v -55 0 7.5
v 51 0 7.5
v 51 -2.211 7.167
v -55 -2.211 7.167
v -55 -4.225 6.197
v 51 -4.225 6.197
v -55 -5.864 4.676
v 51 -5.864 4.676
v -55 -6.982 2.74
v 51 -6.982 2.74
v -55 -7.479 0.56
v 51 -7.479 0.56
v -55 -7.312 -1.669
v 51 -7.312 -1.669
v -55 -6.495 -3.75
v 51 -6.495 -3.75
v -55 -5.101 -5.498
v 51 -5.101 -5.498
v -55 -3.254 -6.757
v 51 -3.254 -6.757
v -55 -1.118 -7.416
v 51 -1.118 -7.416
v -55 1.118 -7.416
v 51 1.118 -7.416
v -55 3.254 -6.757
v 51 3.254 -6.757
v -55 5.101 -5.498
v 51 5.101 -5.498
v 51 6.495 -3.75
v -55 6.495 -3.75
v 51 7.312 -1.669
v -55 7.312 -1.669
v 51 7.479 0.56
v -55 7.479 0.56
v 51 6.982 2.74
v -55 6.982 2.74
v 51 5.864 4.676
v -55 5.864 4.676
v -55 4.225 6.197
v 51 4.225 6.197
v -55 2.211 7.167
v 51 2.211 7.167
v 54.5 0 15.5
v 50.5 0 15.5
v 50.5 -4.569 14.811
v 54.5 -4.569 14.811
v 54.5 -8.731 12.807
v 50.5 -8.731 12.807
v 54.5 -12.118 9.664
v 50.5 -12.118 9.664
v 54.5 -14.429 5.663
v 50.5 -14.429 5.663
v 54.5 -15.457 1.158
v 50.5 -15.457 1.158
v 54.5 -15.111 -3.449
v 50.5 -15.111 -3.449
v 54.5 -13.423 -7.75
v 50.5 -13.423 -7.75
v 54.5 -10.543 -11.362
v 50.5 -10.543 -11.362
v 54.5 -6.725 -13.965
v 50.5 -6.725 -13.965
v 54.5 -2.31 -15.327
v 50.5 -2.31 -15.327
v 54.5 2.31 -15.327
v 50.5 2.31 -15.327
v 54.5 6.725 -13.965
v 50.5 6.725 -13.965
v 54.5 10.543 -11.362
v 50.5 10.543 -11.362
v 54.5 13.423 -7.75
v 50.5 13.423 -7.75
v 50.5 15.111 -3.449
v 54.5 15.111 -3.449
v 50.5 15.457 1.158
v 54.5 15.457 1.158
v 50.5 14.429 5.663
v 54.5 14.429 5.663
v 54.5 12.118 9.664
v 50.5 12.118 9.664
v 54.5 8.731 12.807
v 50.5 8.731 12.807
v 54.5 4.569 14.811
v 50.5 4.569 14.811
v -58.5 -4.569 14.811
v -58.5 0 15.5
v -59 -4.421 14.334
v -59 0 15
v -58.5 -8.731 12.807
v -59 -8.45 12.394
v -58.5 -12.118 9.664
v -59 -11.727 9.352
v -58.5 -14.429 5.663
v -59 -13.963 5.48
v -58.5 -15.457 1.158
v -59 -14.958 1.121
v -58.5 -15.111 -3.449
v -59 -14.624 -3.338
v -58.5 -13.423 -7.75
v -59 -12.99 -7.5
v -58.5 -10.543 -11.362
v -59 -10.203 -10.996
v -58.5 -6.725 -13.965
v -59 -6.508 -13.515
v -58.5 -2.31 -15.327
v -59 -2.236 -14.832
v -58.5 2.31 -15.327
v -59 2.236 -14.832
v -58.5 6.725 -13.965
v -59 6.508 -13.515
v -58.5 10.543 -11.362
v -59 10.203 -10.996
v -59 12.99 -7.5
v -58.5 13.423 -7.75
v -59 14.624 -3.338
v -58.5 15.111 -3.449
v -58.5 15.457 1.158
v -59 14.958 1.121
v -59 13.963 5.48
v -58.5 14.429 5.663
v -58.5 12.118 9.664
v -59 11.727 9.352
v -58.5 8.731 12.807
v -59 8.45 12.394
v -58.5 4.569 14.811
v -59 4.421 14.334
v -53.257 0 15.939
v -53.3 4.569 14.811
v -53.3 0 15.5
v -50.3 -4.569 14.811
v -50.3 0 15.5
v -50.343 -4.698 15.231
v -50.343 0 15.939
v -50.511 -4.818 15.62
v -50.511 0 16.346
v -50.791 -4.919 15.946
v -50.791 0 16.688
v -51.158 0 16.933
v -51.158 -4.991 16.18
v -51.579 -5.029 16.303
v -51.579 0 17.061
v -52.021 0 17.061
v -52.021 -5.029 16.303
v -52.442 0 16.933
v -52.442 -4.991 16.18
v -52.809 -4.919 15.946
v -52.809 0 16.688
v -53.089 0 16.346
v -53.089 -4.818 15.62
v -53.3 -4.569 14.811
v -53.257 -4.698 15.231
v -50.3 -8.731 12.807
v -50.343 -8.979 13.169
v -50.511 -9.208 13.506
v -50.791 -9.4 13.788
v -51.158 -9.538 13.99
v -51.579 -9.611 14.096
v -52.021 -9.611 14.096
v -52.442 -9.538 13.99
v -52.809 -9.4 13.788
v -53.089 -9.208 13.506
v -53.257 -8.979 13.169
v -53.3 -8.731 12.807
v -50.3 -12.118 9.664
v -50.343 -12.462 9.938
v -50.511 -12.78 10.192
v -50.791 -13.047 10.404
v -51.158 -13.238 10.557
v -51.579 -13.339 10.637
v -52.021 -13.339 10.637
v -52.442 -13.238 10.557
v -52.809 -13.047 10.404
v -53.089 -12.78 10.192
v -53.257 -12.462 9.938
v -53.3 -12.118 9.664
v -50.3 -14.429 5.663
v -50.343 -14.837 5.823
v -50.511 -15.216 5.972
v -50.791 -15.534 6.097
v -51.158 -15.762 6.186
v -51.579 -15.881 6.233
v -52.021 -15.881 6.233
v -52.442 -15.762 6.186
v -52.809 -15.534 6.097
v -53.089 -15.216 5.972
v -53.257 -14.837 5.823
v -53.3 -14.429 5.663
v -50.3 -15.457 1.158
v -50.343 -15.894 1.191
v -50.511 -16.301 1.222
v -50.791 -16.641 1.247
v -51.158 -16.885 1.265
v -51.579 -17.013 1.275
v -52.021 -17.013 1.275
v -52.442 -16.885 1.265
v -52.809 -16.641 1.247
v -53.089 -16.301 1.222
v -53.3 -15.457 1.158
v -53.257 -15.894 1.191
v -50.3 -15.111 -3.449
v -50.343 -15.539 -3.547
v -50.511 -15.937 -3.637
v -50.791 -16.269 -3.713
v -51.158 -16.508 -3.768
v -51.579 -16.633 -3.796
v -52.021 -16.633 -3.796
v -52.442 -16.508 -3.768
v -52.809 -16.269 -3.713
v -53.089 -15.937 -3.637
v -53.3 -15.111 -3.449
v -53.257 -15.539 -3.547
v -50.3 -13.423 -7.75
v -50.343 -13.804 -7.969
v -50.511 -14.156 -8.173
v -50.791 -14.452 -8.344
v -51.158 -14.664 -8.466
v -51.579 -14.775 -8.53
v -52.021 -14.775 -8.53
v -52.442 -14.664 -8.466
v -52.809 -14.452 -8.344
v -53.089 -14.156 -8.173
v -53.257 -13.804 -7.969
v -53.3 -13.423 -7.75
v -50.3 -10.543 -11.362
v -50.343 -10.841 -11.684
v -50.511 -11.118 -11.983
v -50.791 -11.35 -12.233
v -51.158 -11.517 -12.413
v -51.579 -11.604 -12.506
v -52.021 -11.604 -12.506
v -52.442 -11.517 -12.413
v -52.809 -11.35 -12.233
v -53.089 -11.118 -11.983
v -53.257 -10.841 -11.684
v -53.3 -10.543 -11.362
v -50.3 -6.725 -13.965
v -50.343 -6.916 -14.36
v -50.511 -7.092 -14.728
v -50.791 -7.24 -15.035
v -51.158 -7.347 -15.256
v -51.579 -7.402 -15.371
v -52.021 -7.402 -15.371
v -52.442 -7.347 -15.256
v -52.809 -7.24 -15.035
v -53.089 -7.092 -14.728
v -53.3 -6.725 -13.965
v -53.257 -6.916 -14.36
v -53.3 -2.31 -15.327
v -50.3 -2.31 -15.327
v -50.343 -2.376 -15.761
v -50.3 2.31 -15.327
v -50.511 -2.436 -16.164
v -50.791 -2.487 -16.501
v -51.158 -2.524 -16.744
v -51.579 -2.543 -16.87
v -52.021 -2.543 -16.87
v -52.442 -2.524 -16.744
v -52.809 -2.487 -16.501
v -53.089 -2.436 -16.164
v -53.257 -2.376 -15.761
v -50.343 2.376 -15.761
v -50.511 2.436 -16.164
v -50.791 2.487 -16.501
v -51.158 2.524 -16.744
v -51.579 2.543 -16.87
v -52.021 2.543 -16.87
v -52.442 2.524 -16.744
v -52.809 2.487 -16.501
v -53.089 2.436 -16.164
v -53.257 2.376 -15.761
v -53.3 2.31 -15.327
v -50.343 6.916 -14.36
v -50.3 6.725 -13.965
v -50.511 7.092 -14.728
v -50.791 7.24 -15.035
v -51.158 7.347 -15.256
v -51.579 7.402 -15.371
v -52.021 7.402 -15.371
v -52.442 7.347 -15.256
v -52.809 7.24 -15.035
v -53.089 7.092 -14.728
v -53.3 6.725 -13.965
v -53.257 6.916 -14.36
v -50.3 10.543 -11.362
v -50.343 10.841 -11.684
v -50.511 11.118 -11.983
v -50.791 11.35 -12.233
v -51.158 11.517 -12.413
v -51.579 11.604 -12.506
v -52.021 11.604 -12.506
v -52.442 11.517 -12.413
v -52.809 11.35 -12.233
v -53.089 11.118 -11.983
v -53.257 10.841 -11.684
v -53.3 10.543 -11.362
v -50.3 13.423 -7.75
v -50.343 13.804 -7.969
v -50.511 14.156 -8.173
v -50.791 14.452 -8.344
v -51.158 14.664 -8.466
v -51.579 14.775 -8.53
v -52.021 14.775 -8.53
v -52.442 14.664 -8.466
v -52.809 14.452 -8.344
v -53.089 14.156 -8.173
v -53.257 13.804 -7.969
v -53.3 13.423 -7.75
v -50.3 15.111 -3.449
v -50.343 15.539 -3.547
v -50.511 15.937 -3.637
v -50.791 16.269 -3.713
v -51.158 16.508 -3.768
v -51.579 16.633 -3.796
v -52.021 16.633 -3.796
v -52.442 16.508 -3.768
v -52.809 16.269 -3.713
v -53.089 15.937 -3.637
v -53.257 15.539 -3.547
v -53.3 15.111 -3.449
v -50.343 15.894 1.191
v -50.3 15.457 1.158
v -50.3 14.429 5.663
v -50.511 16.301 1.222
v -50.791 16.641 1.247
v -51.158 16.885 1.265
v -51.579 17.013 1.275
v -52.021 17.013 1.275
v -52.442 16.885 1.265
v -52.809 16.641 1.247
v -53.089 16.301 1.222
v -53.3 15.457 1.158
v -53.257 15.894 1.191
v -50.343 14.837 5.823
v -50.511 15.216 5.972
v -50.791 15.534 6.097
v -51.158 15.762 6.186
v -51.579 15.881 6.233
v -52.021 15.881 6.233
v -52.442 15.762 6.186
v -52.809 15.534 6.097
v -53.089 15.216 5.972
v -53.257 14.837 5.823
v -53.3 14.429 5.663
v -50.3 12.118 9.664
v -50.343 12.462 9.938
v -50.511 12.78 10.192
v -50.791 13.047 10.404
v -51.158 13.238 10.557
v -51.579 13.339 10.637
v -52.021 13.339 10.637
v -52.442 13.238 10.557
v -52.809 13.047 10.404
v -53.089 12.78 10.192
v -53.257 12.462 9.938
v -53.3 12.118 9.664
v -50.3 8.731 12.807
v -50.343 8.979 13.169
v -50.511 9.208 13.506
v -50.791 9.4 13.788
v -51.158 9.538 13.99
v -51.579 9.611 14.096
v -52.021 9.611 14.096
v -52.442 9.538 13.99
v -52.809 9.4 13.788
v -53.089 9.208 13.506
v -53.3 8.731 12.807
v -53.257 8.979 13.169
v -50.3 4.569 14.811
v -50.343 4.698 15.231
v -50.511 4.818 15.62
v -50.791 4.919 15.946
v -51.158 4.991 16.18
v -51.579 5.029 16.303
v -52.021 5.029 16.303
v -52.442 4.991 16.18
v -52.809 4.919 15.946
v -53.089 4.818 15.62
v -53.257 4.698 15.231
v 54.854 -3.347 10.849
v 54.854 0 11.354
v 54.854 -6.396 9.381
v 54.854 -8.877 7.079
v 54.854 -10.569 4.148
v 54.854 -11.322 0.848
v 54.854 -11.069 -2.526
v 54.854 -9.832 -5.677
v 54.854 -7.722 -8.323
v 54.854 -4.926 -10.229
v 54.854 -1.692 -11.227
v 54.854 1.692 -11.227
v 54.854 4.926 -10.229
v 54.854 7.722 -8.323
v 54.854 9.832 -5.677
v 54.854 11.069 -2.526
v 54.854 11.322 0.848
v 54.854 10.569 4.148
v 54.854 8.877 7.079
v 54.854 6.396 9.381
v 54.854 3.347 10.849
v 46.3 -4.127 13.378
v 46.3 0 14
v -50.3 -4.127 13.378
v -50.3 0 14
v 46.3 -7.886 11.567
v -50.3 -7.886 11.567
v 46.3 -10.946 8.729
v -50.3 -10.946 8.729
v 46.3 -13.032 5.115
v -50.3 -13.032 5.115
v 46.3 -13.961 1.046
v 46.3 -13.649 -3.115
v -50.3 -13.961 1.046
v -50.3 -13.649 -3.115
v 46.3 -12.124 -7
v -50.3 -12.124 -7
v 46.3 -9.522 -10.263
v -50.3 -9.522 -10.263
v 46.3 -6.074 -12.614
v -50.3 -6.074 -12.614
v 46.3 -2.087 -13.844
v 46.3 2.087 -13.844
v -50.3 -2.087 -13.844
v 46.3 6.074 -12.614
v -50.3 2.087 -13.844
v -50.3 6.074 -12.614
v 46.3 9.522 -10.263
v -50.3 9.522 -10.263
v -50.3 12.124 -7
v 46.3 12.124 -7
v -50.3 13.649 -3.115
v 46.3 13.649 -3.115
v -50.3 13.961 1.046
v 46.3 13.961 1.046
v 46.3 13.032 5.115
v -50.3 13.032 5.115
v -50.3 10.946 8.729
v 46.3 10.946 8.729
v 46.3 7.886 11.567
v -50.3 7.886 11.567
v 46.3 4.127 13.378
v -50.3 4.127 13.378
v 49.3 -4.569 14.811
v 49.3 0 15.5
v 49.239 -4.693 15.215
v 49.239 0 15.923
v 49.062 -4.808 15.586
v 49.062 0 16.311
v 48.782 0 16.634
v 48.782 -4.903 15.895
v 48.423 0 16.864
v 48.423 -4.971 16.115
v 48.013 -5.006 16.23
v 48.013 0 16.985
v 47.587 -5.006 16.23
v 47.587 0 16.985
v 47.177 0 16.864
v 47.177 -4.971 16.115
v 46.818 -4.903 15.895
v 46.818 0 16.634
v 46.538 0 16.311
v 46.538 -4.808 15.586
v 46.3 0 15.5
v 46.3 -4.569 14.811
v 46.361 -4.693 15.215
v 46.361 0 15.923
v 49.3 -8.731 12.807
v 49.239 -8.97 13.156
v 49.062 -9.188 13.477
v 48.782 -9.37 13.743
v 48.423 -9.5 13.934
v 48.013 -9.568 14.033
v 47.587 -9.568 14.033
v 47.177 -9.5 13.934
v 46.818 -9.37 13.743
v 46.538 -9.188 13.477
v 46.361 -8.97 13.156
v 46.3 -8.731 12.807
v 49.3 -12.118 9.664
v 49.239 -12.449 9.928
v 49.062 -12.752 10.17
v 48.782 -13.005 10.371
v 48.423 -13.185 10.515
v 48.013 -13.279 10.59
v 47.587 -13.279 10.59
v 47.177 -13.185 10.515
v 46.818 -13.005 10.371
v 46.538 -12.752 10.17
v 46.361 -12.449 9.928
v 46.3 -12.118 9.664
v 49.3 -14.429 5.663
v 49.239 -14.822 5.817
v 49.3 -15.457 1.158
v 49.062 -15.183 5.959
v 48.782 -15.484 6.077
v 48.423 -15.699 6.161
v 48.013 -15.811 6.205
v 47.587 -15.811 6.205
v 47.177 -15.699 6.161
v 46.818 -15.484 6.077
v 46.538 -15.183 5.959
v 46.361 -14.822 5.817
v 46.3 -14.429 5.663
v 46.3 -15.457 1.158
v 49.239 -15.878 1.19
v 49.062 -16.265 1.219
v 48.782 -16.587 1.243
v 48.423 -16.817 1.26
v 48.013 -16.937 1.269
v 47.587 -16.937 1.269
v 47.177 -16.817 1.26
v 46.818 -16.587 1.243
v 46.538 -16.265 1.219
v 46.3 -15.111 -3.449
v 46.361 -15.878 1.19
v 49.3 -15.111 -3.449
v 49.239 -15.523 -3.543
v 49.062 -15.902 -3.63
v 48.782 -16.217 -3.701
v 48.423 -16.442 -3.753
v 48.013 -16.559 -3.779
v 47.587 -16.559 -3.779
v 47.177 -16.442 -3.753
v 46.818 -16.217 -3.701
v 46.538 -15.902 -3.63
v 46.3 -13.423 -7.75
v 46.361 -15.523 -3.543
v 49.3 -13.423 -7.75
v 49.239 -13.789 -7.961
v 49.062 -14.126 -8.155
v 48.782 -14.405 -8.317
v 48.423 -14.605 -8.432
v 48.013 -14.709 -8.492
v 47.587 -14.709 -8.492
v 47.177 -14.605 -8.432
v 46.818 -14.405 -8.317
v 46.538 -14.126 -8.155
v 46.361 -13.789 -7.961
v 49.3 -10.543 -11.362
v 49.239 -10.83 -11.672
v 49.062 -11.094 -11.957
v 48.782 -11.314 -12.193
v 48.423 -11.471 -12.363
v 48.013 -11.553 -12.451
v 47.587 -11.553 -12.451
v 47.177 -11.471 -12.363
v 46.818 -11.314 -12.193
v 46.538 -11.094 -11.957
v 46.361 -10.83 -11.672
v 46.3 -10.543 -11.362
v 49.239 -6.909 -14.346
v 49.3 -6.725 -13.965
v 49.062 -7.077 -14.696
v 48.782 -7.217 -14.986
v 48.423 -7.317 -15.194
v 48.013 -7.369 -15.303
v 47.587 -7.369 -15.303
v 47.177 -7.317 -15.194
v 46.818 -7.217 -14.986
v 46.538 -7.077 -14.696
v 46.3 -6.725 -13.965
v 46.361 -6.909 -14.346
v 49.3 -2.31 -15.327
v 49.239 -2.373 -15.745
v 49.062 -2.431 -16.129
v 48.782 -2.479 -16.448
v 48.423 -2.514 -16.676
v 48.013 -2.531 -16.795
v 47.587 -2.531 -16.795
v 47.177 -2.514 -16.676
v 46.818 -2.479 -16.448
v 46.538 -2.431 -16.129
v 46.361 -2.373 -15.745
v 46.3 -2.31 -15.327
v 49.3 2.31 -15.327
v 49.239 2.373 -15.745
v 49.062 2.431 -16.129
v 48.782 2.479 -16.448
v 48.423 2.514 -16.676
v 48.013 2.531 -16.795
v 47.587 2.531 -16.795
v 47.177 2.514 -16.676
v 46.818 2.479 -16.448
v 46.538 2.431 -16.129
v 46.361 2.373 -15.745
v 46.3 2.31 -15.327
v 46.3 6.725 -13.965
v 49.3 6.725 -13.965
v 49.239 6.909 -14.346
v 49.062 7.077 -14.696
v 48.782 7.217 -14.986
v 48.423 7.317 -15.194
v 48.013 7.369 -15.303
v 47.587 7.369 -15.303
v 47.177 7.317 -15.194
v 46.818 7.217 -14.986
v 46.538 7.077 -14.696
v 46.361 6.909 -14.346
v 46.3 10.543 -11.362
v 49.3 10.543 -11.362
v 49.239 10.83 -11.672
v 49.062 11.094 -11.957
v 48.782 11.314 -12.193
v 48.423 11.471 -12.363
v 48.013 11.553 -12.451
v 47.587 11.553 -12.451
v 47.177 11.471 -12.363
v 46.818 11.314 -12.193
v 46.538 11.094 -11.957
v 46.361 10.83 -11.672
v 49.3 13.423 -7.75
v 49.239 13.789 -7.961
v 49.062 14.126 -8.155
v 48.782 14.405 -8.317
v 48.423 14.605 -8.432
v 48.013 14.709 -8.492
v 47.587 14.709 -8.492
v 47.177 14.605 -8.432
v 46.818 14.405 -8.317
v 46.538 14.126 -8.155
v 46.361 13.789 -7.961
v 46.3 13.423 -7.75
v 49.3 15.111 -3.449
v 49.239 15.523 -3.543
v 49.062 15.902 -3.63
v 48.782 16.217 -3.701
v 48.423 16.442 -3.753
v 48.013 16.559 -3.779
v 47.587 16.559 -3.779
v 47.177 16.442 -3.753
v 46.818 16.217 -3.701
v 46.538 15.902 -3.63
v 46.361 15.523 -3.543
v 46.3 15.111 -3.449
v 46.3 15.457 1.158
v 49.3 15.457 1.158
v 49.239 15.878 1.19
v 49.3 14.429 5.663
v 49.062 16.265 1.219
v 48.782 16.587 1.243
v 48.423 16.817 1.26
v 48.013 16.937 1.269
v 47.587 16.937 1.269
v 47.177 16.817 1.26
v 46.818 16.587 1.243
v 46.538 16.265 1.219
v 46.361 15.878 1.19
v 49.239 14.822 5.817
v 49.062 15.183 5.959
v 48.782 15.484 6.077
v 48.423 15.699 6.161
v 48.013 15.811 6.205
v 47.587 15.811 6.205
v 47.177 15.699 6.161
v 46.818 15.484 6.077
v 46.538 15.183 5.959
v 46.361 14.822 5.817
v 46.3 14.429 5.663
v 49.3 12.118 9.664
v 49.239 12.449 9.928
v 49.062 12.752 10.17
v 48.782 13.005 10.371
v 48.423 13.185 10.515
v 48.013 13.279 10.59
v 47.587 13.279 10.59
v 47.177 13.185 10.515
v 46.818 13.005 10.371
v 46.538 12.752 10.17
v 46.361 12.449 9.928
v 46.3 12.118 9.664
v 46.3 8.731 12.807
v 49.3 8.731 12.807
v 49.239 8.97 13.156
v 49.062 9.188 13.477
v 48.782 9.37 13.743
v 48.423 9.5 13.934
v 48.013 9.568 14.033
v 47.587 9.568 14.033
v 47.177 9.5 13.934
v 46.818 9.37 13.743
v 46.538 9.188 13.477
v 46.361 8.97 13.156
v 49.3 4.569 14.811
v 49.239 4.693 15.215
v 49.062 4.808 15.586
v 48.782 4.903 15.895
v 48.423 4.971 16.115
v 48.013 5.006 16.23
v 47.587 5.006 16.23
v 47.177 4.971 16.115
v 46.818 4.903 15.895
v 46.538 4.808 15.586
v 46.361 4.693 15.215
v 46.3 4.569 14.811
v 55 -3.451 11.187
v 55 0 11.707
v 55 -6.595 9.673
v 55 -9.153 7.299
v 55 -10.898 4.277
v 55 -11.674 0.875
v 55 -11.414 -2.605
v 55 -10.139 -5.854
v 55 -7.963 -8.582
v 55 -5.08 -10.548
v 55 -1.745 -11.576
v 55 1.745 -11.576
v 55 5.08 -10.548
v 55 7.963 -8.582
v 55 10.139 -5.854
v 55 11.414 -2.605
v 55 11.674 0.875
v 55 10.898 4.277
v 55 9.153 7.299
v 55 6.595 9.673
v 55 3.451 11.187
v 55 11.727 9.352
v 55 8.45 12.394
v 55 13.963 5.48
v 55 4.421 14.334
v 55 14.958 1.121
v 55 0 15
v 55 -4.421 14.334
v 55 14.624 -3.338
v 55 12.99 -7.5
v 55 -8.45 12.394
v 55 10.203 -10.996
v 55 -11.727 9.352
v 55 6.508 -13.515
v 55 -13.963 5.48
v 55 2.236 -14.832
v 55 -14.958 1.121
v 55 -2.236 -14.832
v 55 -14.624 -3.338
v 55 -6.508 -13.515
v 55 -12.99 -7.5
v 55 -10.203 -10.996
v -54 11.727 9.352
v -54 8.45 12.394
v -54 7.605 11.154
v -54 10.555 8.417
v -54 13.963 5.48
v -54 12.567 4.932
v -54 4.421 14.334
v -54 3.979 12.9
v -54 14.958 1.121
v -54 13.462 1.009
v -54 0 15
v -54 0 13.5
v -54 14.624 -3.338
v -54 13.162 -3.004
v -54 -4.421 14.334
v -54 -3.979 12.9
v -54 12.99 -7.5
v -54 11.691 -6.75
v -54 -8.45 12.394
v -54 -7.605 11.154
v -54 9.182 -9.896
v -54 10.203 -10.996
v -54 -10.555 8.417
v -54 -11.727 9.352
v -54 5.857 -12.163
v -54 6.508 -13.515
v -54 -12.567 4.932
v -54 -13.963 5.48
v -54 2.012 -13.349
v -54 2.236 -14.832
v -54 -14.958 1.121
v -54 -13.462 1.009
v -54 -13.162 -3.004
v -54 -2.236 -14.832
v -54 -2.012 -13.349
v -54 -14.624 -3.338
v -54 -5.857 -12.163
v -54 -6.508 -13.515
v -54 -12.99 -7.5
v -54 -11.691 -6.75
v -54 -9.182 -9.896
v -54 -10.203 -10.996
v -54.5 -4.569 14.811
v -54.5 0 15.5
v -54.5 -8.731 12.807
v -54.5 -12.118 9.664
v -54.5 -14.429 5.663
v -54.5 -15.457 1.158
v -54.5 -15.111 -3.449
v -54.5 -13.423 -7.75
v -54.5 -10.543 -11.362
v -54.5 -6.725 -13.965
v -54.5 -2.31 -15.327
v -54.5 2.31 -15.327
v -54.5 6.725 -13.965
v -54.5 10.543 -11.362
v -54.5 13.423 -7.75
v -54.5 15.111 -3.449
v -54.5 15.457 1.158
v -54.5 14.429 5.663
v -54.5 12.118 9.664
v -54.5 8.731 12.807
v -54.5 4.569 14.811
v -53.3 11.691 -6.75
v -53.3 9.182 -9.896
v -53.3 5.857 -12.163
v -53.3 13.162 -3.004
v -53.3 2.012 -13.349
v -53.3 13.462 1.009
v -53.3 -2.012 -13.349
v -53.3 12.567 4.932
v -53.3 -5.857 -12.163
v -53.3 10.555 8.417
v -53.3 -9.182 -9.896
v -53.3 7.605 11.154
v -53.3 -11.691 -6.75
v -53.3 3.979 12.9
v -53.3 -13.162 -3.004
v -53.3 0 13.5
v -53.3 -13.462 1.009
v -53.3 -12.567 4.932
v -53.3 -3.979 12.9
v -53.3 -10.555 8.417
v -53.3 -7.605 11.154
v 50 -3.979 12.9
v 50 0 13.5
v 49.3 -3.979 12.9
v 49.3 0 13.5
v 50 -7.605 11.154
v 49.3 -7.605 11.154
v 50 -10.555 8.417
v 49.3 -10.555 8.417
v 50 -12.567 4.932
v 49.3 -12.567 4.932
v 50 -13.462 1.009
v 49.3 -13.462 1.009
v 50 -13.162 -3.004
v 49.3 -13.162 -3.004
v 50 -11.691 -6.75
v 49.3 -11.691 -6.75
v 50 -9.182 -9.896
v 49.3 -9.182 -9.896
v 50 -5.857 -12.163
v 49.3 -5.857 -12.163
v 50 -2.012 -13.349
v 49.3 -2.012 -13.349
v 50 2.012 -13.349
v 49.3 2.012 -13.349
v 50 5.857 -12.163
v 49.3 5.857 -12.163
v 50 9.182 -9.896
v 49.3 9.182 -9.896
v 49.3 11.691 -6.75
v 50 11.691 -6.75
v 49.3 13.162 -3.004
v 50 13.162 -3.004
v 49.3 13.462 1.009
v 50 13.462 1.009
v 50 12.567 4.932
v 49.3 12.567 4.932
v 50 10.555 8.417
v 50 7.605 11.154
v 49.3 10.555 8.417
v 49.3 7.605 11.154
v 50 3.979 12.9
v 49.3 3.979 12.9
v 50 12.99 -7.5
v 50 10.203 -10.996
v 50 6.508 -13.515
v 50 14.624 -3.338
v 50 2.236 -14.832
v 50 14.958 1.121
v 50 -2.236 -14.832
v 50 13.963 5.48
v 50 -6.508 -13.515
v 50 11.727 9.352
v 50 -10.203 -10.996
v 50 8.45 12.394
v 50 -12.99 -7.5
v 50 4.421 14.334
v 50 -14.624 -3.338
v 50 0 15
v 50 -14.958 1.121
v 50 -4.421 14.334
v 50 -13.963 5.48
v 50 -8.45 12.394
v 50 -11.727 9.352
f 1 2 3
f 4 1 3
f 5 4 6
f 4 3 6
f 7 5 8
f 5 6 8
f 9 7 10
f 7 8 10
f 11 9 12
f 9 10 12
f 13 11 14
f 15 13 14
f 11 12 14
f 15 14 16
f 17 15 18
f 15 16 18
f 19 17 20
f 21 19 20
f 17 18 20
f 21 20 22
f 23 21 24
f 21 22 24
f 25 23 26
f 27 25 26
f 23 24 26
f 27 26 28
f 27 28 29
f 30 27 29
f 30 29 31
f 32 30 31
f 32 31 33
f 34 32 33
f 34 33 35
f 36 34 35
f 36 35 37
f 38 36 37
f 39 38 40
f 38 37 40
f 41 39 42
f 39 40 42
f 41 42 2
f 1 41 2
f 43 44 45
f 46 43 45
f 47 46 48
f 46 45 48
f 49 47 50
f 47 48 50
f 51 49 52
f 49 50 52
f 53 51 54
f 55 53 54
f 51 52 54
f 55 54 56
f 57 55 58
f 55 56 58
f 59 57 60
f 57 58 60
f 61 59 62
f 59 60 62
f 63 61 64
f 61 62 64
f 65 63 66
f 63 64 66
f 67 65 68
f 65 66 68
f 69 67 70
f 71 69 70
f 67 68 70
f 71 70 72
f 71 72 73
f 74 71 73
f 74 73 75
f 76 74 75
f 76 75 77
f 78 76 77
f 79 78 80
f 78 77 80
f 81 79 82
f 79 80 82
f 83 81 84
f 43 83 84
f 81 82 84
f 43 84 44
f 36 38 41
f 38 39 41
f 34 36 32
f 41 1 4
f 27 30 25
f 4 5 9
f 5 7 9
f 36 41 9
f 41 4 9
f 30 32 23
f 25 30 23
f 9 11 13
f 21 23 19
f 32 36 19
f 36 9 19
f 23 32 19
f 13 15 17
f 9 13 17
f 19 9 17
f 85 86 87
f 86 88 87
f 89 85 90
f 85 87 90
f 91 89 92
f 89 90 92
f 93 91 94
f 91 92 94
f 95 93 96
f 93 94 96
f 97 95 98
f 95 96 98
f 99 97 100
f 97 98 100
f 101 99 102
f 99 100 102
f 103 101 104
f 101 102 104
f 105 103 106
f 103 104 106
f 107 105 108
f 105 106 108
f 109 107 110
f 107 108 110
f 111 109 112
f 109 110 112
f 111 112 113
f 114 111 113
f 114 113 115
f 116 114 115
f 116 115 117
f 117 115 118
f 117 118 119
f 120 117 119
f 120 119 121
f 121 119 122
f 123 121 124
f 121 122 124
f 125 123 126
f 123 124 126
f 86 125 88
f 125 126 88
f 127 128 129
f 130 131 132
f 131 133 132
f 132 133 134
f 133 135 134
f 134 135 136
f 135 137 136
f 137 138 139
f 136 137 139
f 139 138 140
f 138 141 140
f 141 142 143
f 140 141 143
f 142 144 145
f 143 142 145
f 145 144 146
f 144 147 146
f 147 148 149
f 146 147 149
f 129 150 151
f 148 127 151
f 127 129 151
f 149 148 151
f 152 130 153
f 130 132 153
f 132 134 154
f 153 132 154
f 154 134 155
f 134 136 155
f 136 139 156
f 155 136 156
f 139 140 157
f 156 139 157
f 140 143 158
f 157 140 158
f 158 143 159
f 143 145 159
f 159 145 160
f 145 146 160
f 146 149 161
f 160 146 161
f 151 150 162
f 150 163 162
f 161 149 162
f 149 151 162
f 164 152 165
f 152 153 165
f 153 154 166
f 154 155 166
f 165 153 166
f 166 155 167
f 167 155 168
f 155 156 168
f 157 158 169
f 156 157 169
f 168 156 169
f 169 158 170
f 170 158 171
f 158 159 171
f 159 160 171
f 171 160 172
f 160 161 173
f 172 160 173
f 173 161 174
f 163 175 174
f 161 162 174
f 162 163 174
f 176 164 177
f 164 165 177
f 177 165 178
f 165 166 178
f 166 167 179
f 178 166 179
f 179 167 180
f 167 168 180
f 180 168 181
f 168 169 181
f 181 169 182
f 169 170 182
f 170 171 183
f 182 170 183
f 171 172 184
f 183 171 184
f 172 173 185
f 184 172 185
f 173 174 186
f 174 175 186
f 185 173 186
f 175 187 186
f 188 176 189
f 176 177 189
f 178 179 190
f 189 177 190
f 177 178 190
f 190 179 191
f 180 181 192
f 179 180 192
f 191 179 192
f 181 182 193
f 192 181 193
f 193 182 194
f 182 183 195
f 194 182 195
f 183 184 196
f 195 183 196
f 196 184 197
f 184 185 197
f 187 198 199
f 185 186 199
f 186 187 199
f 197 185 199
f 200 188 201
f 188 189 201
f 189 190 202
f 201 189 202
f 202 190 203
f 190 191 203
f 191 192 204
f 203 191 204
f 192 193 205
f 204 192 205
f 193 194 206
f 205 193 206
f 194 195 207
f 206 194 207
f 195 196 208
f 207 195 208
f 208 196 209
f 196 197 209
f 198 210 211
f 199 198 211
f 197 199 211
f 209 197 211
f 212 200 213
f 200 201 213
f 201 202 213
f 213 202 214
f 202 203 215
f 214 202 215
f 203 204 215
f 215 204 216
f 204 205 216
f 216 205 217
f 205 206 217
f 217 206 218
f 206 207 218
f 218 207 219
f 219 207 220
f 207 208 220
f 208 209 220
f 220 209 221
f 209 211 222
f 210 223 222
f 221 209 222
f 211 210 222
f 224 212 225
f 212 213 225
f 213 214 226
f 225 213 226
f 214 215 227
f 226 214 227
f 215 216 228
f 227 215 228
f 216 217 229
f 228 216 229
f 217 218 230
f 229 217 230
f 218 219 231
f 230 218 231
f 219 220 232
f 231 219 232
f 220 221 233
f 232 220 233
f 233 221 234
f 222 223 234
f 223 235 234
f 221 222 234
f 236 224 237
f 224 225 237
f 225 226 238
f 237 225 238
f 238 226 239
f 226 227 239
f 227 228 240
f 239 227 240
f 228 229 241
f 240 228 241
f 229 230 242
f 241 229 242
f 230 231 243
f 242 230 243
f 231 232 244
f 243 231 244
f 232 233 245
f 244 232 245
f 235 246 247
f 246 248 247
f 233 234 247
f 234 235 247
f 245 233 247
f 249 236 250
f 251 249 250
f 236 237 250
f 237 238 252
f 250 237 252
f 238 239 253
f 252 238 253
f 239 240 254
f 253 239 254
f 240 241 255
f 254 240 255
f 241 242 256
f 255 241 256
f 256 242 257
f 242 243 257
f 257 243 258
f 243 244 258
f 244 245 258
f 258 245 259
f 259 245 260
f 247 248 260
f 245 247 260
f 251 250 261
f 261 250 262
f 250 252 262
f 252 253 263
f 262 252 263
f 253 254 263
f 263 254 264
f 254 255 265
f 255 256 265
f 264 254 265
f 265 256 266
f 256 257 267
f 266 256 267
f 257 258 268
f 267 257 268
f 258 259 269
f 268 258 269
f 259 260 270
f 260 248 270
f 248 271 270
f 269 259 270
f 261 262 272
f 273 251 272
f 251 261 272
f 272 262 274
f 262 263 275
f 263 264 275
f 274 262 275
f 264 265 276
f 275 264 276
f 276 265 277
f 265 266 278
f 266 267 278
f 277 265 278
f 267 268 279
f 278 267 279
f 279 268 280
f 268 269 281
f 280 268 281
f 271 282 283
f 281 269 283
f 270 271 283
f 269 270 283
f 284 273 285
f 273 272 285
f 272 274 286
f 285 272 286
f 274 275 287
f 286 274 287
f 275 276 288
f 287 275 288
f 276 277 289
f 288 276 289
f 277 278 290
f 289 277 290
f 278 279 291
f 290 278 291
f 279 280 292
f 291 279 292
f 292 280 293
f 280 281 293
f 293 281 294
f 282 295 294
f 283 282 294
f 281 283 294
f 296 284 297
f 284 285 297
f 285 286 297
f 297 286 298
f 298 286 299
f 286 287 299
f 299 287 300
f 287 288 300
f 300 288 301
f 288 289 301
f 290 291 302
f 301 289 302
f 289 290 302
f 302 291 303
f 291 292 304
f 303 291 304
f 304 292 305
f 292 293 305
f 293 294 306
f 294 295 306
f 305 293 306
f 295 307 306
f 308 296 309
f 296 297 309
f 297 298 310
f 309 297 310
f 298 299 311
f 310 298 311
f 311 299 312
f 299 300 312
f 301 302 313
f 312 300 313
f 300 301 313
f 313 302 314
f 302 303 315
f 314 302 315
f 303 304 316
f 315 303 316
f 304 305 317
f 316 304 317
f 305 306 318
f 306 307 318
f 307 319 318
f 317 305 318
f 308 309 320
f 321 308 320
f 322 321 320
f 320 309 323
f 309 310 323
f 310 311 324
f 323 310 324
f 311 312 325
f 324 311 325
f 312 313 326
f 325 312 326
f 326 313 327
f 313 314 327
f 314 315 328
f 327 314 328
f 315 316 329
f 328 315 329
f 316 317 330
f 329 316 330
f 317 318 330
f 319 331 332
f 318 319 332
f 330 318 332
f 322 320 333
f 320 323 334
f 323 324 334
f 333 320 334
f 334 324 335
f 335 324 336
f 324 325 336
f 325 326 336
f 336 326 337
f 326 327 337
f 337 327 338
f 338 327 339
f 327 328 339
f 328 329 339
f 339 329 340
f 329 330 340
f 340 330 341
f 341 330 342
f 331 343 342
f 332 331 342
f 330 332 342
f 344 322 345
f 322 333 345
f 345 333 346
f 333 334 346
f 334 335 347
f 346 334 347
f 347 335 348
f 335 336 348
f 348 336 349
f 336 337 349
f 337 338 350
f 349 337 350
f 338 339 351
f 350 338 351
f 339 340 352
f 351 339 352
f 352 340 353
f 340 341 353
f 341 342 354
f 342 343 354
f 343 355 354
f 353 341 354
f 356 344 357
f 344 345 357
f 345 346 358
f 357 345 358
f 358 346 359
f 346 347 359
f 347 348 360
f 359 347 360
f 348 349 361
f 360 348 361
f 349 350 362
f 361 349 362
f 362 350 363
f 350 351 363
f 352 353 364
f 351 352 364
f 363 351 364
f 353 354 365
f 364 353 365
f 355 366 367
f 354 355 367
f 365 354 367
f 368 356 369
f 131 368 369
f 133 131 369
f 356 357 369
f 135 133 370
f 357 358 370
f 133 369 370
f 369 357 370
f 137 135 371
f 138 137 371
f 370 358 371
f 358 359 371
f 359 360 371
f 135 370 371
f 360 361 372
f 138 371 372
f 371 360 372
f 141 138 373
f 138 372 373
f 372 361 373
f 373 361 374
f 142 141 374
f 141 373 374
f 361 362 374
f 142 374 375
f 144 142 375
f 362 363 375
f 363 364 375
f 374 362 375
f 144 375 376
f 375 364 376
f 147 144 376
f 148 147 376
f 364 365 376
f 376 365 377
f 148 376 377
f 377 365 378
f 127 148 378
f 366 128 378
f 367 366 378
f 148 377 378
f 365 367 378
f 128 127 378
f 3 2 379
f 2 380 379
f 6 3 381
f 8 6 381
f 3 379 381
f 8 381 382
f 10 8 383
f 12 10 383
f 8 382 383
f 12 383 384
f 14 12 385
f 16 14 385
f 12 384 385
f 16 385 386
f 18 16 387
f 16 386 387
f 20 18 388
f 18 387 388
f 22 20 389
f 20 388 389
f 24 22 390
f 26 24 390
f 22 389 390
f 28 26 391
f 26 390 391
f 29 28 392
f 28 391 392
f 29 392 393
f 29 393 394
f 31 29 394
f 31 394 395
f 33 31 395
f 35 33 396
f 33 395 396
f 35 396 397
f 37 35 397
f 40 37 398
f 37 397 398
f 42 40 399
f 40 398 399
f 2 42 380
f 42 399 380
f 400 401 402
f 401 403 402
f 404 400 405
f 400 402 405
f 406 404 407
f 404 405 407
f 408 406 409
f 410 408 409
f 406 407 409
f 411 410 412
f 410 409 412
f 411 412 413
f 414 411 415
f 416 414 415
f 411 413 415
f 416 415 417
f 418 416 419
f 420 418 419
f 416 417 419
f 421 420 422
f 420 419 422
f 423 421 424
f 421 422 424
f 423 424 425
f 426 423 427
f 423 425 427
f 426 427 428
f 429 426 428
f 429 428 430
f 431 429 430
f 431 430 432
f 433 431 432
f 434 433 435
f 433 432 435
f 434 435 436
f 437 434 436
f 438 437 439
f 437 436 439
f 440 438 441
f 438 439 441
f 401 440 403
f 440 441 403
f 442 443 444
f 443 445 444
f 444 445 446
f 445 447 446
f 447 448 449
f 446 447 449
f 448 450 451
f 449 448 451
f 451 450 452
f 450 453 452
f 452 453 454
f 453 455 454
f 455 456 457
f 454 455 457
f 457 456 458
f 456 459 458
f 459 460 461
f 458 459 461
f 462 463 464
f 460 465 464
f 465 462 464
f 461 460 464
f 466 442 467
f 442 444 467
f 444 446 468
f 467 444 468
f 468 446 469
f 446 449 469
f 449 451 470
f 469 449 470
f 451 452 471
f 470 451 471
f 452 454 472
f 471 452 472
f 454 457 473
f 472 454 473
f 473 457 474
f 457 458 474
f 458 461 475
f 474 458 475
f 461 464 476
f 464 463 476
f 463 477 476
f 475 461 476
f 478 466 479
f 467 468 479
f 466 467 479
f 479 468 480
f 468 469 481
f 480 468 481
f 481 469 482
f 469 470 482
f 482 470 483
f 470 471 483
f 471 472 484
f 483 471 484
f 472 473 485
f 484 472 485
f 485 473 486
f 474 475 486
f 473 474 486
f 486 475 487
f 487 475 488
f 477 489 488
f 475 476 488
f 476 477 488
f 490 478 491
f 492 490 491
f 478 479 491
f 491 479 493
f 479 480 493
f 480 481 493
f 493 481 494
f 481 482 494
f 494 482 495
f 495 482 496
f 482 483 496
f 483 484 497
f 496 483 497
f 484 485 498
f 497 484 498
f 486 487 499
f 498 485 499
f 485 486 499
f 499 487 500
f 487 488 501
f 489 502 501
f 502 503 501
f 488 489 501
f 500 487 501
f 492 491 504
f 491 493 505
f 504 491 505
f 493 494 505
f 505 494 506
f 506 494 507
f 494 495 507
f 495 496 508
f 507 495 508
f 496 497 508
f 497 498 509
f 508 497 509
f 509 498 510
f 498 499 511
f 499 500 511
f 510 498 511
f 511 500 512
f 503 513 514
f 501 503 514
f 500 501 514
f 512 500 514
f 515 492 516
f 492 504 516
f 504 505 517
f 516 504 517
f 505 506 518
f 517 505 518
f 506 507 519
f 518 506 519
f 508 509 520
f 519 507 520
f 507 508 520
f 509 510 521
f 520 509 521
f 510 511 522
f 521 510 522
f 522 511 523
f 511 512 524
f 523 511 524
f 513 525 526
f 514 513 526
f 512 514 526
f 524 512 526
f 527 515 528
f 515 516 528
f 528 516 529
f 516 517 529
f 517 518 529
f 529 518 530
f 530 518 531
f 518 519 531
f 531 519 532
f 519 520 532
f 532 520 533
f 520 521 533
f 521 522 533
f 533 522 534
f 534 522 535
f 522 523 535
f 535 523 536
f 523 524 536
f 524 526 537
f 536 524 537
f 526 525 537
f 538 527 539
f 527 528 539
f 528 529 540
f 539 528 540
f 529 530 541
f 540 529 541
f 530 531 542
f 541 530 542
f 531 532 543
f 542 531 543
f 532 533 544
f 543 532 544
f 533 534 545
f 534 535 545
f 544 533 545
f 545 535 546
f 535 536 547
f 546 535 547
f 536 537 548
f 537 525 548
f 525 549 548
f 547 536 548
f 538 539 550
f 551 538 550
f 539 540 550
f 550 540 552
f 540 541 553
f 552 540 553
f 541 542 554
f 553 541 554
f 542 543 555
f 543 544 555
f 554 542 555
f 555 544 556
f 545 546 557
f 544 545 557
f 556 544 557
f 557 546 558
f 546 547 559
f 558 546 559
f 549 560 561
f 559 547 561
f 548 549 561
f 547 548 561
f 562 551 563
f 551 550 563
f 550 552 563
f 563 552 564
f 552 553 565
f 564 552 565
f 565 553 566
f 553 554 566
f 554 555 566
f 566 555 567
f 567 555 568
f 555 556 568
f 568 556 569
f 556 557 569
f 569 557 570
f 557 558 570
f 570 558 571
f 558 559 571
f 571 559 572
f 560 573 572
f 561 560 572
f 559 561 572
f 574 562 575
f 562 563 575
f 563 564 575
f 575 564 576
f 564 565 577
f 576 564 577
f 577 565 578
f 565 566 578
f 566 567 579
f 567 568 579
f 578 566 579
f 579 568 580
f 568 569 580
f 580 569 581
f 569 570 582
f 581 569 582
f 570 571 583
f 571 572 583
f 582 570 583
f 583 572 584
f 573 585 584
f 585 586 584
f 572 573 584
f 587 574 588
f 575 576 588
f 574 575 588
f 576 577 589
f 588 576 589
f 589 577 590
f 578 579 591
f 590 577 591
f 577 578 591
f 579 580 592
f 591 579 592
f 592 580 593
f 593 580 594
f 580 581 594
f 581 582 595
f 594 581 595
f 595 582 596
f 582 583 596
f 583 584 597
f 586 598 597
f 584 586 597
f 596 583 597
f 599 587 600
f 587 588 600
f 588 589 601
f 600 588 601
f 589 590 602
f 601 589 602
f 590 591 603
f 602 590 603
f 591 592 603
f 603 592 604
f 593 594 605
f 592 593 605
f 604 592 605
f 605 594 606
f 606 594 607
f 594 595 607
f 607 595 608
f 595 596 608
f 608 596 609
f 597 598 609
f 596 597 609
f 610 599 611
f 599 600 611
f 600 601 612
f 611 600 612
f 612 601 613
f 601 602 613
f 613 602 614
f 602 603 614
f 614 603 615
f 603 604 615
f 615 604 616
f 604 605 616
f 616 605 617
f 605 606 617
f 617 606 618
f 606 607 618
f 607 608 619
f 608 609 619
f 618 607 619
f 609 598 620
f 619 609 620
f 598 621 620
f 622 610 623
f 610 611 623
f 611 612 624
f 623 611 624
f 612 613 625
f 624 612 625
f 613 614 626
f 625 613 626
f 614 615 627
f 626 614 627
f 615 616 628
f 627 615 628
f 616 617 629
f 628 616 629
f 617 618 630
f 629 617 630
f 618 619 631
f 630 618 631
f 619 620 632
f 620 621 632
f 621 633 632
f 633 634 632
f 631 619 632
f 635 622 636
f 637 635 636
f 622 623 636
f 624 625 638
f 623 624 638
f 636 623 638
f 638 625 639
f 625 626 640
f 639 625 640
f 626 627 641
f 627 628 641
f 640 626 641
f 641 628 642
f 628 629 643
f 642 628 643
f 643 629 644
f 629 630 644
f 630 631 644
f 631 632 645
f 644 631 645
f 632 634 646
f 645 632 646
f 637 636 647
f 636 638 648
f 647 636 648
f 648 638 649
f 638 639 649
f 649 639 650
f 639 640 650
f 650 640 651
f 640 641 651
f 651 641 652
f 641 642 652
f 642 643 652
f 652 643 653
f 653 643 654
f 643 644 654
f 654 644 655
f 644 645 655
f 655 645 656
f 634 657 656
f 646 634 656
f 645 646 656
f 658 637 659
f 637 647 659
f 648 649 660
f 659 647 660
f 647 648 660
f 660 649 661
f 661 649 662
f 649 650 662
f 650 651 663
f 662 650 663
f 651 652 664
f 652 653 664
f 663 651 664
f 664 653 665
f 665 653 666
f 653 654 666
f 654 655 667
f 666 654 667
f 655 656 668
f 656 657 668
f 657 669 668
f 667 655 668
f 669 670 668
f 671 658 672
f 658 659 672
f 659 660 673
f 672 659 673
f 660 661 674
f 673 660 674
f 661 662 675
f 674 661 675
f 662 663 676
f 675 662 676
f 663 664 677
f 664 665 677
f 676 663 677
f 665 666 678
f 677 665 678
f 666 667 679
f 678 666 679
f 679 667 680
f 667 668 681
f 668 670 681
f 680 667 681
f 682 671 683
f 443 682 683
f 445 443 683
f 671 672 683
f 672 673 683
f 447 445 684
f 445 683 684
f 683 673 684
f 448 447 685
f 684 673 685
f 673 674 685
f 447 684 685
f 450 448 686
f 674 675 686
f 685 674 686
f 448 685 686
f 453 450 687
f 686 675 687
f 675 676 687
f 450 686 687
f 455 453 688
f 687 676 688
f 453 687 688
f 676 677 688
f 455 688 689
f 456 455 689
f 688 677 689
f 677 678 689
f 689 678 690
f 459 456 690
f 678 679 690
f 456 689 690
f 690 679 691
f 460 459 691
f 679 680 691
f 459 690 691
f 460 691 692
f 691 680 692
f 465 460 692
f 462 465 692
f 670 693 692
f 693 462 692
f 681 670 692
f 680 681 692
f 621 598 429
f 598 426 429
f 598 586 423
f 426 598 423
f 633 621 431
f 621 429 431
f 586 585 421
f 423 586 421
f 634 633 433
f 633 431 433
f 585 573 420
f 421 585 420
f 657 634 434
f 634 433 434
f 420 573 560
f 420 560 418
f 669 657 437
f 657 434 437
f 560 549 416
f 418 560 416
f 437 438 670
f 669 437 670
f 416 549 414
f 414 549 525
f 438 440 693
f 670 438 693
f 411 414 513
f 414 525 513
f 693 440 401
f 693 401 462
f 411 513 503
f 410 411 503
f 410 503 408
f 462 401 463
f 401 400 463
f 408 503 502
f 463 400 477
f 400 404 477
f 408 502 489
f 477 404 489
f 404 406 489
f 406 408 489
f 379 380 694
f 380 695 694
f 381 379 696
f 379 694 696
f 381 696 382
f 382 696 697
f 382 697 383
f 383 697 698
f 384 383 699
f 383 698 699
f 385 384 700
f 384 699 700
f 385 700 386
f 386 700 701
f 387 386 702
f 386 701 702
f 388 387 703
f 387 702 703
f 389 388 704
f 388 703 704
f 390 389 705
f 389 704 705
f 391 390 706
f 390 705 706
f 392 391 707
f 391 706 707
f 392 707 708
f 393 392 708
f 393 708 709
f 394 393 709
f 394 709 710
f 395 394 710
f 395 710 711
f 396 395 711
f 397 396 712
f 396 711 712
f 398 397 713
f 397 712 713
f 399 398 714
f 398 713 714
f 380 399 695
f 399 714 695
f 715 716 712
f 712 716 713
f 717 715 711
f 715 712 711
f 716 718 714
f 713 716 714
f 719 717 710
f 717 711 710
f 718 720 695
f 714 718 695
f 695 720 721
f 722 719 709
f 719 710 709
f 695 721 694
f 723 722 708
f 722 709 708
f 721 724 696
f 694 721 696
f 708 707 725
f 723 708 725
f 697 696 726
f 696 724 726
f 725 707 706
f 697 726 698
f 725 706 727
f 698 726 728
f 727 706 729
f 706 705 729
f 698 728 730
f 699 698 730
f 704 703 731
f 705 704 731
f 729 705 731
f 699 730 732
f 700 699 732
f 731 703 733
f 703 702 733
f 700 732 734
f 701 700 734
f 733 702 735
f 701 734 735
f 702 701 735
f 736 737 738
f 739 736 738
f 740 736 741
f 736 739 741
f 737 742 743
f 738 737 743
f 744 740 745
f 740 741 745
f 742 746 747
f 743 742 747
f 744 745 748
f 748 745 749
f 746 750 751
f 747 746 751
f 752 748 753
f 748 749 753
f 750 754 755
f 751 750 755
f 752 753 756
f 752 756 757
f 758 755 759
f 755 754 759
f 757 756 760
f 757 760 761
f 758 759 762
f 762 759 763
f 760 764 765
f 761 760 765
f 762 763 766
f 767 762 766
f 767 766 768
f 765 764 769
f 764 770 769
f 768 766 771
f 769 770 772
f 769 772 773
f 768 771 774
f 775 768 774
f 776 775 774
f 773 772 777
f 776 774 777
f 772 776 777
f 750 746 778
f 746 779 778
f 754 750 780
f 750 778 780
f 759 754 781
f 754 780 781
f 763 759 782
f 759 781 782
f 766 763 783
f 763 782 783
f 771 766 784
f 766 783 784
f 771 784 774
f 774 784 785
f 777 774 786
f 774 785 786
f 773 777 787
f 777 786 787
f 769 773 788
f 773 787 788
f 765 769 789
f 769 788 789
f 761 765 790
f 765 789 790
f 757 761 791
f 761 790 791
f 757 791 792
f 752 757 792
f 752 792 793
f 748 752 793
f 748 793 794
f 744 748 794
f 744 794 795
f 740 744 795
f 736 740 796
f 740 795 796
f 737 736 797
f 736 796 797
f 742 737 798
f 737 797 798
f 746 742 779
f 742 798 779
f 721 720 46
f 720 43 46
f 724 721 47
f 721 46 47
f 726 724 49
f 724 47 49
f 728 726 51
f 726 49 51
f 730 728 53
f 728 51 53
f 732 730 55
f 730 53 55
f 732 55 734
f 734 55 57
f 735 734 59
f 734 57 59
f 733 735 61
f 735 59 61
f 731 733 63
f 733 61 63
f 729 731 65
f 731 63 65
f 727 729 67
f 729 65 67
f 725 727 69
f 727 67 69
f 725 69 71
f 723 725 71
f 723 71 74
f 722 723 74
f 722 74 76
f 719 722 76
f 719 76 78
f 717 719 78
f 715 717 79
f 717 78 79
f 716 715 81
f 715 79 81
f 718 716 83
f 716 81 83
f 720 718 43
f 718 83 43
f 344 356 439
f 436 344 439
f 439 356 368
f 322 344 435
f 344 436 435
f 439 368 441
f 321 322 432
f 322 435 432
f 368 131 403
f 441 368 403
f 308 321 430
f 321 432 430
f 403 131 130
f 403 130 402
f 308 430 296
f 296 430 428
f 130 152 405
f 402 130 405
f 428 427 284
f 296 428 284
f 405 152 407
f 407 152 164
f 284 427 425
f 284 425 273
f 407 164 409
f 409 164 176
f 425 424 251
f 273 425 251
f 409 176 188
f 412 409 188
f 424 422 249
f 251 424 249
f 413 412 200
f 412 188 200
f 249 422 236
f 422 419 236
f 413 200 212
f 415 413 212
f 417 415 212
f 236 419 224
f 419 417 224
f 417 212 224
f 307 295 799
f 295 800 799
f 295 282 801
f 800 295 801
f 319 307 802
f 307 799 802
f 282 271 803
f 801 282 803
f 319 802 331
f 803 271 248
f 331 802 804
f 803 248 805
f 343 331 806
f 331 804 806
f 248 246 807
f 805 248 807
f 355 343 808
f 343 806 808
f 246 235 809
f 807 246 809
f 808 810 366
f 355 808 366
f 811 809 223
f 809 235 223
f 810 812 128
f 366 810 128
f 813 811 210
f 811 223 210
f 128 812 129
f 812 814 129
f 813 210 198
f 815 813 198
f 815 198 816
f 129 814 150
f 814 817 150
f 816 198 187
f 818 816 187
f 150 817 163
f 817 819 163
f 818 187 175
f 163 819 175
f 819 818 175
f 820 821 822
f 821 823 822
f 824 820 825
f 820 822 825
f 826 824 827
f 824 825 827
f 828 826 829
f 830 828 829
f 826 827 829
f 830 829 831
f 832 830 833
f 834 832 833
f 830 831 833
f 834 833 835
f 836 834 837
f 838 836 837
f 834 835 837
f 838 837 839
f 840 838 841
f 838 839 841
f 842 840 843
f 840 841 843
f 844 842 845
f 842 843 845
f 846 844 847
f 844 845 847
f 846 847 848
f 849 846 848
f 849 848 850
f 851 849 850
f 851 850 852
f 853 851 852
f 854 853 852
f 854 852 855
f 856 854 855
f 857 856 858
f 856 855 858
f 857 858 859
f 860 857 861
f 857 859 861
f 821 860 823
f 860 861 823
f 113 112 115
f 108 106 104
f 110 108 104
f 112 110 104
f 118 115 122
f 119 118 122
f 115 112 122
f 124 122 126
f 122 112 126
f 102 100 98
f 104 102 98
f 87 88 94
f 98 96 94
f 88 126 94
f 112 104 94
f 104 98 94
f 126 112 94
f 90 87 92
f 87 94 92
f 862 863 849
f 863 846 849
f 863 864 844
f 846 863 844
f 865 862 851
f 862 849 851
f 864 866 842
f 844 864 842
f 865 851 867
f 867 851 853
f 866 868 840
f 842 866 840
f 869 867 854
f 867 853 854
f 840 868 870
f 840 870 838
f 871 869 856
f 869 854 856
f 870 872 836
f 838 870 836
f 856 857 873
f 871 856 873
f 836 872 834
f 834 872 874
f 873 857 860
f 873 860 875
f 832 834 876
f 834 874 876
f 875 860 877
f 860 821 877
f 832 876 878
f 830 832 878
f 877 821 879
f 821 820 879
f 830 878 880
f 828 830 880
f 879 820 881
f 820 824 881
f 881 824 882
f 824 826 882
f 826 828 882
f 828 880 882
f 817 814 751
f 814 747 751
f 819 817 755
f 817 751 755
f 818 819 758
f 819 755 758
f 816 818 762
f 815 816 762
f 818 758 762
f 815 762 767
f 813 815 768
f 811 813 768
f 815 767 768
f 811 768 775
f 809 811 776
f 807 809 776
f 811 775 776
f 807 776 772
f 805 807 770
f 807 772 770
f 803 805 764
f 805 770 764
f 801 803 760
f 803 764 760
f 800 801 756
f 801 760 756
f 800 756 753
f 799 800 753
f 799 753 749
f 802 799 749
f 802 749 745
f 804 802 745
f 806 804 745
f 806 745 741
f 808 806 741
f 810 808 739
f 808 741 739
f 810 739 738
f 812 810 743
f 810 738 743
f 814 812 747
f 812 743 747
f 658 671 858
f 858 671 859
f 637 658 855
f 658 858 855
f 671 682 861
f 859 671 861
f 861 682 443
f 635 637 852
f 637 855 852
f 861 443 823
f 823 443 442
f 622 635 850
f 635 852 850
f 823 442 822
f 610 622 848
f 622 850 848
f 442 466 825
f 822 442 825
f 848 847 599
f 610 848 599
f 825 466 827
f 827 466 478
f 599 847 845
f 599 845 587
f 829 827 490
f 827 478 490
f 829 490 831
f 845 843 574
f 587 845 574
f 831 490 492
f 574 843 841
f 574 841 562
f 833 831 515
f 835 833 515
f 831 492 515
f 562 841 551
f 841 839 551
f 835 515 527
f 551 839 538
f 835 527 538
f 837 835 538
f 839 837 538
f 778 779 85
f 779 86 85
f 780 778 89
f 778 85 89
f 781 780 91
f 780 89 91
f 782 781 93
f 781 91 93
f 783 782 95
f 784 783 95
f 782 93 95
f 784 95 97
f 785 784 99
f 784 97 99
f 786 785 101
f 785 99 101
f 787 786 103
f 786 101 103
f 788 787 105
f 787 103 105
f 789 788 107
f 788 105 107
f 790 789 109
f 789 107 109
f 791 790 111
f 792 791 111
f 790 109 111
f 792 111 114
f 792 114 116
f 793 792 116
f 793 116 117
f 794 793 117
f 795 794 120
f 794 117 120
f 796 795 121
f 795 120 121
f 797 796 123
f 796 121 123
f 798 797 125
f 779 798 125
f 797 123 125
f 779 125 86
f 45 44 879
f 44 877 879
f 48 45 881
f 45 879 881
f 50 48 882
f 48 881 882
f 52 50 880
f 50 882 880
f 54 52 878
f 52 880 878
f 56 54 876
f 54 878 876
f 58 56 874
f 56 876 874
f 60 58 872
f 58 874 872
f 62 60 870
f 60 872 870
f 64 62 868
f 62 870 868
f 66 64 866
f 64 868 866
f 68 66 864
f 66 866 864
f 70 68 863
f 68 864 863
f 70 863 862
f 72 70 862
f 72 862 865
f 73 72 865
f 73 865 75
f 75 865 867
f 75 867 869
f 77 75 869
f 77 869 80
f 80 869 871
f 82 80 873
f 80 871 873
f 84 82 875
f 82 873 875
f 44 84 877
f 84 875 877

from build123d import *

# Parameters (mm, degrees)
F2_SIZE = 4


# Not quite as in the source:
# - a fillet or chamfer that OpenCascade refuses, or shapes differently, is made with other operations: its cross-section is extruded or revolved along the edge and cut away or added


with BuildPart() as f1:
    # F0 (on Front) → F1 (revolve)
    with BuildSketch(Plane.XZ):
        with BuildLine():
            Line((-55, 0), (-55, 7.5))
            Line((-55, 7.5), (55, 7.5))
            Line((55, 7.5), (55, 15.5))
            Line((55, 15.5), (50, 15.5))
            Line((50, 15.5), (50, 13.5))
            Line((50, 13.5), (49.3, 13.5))
            Line((49.3, 13.5), (49.3, 15.5))
            ThreePointArc((49.3, 15.5), (47.8, 17), (46.3, 15.5))
            Line((46.3, 15.5), (46.3, 14))
            Line((46.3, 14), (-50.3, 14))
            Line((-50.3, 14), (-50.3, 15.5))
            ThreePointArc((-50.3, 15.5), (-51.8, 17.0770088649), (-53.3, 15.5))
            Line((-53.3, 15.5), (-53.3, 13.5))
            Line((-53.3, 13.5), (-54, 13.5))
            Line((-54, 13.5), (-54, 15.5))
            Line((-54, 15.5), (-59, 15.5))
            Line((-59, 15.5), (-59, 0))
            Line((-59, 0), (-55, 0))
        make_face()
    revolve(axis=Axis((-4.5135766268, 0, 0), (1, 0, 0)))

    # F2
    f2_edges = [f1.edges().sort_by_distance(p)[0] for p in [
        (55, 0, -7.5),
    ]]
    chamfer(f2_edges, length=F2_SIZE)

    # F3: chamfer of 0.5 on 5 edges, made by hand

    # F3_s1 → F3_t2 (revolve, cut)
    with BuildSketch(Plane.XZ):
        Polygon((55, 15), (54.5, 15.5), (55, 15.5), align=None)
    revolve(axis=Axis((55, 0, 0), (1, 0, 0)), mode=Mode.SUBTRACT)

    # F3_s3 → F3_t4 (revolve, cut)
    with BuildSketch(Plane.XZ):
        Polygon((54.8535533906, 11.3535533906), (55, 11.7071067812), (55, 11.5), align=None)
    revolve(axis=Axis((55, 0, 0), (1, 0, 0)), mode=Mode.SUBTRACT)

    # F3_s5 → F3_t6 (revolve, cut)
    with BuildSketch(Plane.XZ):
        Polygon((-58.5, 15.5), (-59, 15), (-59, 15.5), align=None)
    revolve(axis=Axis((-59, 0, 0), (1, 0, 0)), mode=Mode.SUBTRACT)

    # F3_s7 → F3_t8 (revolve, cut)
    with BuildSketch(Plane.XZ):
        Polygon((-54, 15), (-54.5, 15.5), (-54, 15.5), align=None)
    revolve(axis=Axis((-54, 0, 0), (1, 0, 0)), mode=Mode.SUBTRACT)

    # F3_s9 → F3_t10 (revolve, cut)
    with BuildSketch(Plane.XZ):
        Polygon((50.5, 15.5), (50, 15), (50, 15.5), align=None)
    revolve(axis=Axis((50, 0, 0), (1, 0, 0)), mode=Mode.SUBTRACT)


solid = f1.part
